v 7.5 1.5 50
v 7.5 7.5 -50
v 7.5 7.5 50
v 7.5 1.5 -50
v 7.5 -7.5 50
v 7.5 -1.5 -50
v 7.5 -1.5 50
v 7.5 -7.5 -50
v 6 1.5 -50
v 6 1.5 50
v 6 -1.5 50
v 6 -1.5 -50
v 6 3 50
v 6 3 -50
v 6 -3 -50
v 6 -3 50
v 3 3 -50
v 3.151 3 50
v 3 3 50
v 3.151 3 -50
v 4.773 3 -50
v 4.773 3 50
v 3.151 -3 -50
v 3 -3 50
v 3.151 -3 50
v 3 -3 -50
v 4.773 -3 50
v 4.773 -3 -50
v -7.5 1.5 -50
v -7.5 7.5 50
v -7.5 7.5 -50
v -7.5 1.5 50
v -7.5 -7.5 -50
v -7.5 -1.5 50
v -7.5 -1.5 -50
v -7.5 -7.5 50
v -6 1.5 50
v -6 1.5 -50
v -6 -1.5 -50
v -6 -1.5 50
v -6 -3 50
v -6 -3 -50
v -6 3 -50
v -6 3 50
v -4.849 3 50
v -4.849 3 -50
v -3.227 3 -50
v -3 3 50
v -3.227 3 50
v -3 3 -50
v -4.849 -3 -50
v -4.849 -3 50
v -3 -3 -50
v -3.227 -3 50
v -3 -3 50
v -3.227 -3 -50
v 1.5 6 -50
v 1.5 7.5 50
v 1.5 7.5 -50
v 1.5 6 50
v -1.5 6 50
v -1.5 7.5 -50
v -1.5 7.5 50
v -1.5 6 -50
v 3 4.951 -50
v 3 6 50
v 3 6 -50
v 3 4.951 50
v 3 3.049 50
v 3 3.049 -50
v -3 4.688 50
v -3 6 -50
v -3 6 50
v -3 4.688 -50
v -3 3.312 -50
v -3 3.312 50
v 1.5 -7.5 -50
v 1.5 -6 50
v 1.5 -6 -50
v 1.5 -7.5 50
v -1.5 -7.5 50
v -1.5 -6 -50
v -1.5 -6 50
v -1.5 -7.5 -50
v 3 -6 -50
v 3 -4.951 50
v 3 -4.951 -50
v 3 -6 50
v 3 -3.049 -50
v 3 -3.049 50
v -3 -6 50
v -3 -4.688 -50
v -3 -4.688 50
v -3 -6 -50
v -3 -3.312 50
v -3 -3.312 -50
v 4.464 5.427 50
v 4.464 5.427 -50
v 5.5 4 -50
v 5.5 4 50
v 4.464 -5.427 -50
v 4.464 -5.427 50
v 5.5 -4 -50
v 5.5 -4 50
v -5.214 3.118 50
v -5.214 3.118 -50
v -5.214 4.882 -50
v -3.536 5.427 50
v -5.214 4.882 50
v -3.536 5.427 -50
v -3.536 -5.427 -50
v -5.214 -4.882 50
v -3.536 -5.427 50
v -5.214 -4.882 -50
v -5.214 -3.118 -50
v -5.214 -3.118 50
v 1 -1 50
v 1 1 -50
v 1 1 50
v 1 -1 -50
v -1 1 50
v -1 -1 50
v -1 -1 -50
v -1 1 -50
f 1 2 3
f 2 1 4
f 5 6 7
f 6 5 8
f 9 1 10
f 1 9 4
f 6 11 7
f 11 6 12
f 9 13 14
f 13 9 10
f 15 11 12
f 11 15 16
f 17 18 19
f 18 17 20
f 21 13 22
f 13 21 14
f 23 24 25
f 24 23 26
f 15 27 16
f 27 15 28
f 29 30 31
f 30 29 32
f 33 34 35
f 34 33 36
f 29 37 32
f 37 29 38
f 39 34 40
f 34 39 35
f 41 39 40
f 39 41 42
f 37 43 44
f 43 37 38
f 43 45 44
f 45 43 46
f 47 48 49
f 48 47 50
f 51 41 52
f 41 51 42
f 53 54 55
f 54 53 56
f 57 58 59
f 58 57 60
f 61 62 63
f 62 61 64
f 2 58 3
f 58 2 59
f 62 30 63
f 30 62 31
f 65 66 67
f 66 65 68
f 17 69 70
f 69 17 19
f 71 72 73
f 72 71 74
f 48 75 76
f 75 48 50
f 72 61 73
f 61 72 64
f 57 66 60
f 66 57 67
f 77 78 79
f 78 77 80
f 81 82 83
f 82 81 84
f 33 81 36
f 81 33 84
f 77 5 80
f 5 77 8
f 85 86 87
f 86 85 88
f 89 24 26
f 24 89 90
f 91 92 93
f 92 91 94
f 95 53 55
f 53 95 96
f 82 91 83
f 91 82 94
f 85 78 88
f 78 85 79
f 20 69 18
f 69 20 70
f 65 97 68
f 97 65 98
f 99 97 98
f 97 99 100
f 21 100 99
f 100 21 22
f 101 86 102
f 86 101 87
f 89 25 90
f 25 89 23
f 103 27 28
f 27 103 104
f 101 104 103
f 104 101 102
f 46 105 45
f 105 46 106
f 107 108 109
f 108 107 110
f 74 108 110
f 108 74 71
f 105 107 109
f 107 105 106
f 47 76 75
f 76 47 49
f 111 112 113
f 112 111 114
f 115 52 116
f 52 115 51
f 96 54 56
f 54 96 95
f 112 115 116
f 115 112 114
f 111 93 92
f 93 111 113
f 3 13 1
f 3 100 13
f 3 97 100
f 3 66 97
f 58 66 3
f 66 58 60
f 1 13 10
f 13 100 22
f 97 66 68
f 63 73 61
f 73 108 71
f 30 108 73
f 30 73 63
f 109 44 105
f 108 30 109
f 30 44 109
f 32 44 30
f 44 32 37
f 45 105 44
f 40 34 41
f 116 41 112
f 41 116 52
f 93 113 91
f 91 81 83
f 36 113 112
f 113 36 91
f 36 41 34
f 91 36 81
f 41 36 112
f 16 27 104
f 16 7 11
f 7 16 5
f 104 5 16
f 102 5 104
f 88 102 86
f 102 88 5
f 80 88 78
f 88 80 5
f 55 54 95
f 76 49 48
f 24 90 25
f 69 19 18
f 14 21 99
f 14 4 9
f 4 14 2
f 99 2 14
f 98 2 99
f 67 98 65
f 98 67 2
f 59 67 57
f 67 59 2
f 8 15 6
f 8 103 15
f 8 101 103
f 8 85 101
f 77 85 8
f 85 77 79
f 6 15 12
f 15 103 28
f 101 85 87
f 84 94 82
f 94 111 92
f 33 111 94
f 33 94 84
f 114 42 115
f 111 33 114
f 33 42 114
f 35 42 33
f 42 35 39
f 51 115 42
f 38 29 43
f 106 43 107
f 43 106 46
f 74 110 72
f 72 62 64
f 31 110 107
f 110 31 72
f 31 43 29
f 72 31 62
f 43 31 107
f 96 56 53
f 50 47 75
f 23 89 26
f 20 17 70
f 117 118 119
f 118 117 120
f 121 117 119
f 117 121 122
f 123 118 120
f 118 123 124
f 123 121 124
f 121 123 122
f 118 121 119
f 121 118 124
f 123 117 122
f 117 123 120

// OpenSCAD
// Parameters
cross_section_width_mm = 15; //[7.5:30:0.5]
cross_section_height_mm = 15; //[7.5:30:0.5]
length_mm = 100; //[50:200:1]
centered = 1; //[0:1:1]
corner_hole = 1; //[0:1:1]
overlap_mm = 1; //[0.5:2:0.1]
wall_thickness_mm = 2; //[1:4:0.25]
slot_opening_mm = 3; //[2:6:0.25]
slot_cavity_width_mm = 6; //[4:10:0.25]
slot_depth_mm = 4.5; //[2.5:7.5:0.25]
center_bore_diameter_mm = 5; //[3:10:0.25]
corner_hole_diameter_mm = 3; //[0:6:0.25]
corner_hole_inset_mm = 3.5; //[2:6:0.25]

// Extrusion Profile Body
module extrusion_profile_body() {
  color("Silver") {
    cube([cross_section_width_mm, cross_section_height_mm, length_mm], center=true);
  }
}

// T-Slot Channels
module t_slot_channels() {
  color("DimGray") {
    union() {
      translate([cross_section_width_mm/2 - (slot_depth_mm + overlap_mm)/2, 0, 0])
        cube([slot_depth_mm + overlap_mm, slot_opening_mm, length_mm + 2*overlap_mm], center=true);
      translate([cross_section_width_mm/2 - (slot_depth_mm + overlap_mm)/2 - (slot_opening_mm/2), 0, 0])
        cube([slot_depth_mm + overlap_mm, slot_cavity_width_mm, length_mm + 2*overlap_mm], center=true);
      translate([-cross_section_width_mm/2 + (slot_depth_mm + overlap_mm)/2, 0, 0])
        cube([slot_depth_mm + overlap_mm, slot_opening_mm, length_mm + 2*overlap_mm], center=true);
      translate([-cross_section_width_mm/2 + (slot_depth_mm + overlap_mm)/2 + (slot_opening_mm/2), 0, 0])
        cube([slot_depth_mm + overlap_mm, slot_cavity_width_mm, length_mm + 2*overlap_mm], center=true);
      translate([0, cross_section_height_mm/2 - (slot_depth_mm + overlap_mm)/2, 0])
        cube([slot_opening_mm, slot_depth_mm + overlap_mm, length_mm + 2*overlap_mm], center=true);
      translate([0, cross_section_height_mm/2 - (slot_depth_mm + overlap_mm)/2 - (slot_opening_mm/2), 0])
        cube([slot_cavity_width_mm, slot_depth_mm + overlap_mm, length_mm + 2*overlap_mm], center=true);
      translate([0, -cross_section_height_mm/2 + (slot_depth_mm + overlap_mm)/2, 0])
        cube([slot_opening_mm, slot_depth_mm + overlap_mm, length_mm + 2*overlap_mm], center=true);
      translate([0, -cross_section_height_mm/2 + (slot_depth_mm + overlap_mm)/2 + (slot_opening_mm/2), 0])
        cube([slot_cavity_width_mm, slot_depth_mm + overlap_mm, length_mm + 2*overlap_mm], center=true);
    }
  }
}

// Center Bore or Void
module center_bore_or_void() {
  color("Black") {
    cylinder(r=center_bore_diameter_mm/2, h=length_mm + 2*overlap_mm, center=true);
  }
}

// Corner Holes Optional
module corner_holes_optional() {
  color("Black") {
    if (corner_hole) {
      union() {
        translate([cross_section_width_mm/2 - corner_hole_inset_mm, cross_section_height_mm/2 - corner_hole_inset_mm, 0])
          cylinder(r=(corner_hole_diameter_mm*corner_hole)/2, h=length_mm + 2*overlap_mm, center=true);
        translate([cross_section_width_mm/2 - corner_hole_inset_mm, -cross_section_height_mm/2 + corner_hole_inset_mm, 0])
          cylinder(r=(corner_hole_diameter_mm*corner_hole)/2, h=length_mm + 2*overlap_mm, center=true);
        translate([-cross_section_width_mm/2 + corner_hole_inset_mm, cross_section_height_mm/2 - corner_hole_inset_mm, 0])
          cylinder(r=(corner_hole_diameter_mm*corner_hole)/2, h=length_mm + 2*overlap_mm, center=true);
        translate([-cross_section_width_mm/2 + corner_hole_inset_mm, -cross_section_height_mm/2 + corner_hole_inset_mm, 0])
          cylinder(r=(corner_hole_diameter_mm*corner_hole)/2, h=length_mm + 2*overlap_mm, center=true);
      }
    }
  }
}

// Box Corner Profile Section
module box_corner_profile_section() {
  color("Silver") {
    cube([wall_thickness_mm, wall_thickness_mm, length_mm], center=true);
  }
}

// Box Corner Profile Sections
module box_corner_profile_sections() {
  color("Silver") {
    union() {
      box_corner_profile_section();
      translate([cross_section_width_mm/2 - wall_thickness_mm/2, cross_section_height_mm/2 - wall_thickness_mm/2, 0])
        box_corner_profile_section();
    }
  }
}

// Extrusion Cross Section
module extrusion_cross_section() {
  difference() {
    extrusion_profile_body();
    t_slot_channels();
    center_bore_or_void();
    corner_holes_optional();
  }
}

// Extrusion
module extrusion() {
  union() {
    extrusion_cross_section();
    box_corner_profile_sections();
  }
}

// Assembly
module assembly() {
  extrusion();
}

assembly();
